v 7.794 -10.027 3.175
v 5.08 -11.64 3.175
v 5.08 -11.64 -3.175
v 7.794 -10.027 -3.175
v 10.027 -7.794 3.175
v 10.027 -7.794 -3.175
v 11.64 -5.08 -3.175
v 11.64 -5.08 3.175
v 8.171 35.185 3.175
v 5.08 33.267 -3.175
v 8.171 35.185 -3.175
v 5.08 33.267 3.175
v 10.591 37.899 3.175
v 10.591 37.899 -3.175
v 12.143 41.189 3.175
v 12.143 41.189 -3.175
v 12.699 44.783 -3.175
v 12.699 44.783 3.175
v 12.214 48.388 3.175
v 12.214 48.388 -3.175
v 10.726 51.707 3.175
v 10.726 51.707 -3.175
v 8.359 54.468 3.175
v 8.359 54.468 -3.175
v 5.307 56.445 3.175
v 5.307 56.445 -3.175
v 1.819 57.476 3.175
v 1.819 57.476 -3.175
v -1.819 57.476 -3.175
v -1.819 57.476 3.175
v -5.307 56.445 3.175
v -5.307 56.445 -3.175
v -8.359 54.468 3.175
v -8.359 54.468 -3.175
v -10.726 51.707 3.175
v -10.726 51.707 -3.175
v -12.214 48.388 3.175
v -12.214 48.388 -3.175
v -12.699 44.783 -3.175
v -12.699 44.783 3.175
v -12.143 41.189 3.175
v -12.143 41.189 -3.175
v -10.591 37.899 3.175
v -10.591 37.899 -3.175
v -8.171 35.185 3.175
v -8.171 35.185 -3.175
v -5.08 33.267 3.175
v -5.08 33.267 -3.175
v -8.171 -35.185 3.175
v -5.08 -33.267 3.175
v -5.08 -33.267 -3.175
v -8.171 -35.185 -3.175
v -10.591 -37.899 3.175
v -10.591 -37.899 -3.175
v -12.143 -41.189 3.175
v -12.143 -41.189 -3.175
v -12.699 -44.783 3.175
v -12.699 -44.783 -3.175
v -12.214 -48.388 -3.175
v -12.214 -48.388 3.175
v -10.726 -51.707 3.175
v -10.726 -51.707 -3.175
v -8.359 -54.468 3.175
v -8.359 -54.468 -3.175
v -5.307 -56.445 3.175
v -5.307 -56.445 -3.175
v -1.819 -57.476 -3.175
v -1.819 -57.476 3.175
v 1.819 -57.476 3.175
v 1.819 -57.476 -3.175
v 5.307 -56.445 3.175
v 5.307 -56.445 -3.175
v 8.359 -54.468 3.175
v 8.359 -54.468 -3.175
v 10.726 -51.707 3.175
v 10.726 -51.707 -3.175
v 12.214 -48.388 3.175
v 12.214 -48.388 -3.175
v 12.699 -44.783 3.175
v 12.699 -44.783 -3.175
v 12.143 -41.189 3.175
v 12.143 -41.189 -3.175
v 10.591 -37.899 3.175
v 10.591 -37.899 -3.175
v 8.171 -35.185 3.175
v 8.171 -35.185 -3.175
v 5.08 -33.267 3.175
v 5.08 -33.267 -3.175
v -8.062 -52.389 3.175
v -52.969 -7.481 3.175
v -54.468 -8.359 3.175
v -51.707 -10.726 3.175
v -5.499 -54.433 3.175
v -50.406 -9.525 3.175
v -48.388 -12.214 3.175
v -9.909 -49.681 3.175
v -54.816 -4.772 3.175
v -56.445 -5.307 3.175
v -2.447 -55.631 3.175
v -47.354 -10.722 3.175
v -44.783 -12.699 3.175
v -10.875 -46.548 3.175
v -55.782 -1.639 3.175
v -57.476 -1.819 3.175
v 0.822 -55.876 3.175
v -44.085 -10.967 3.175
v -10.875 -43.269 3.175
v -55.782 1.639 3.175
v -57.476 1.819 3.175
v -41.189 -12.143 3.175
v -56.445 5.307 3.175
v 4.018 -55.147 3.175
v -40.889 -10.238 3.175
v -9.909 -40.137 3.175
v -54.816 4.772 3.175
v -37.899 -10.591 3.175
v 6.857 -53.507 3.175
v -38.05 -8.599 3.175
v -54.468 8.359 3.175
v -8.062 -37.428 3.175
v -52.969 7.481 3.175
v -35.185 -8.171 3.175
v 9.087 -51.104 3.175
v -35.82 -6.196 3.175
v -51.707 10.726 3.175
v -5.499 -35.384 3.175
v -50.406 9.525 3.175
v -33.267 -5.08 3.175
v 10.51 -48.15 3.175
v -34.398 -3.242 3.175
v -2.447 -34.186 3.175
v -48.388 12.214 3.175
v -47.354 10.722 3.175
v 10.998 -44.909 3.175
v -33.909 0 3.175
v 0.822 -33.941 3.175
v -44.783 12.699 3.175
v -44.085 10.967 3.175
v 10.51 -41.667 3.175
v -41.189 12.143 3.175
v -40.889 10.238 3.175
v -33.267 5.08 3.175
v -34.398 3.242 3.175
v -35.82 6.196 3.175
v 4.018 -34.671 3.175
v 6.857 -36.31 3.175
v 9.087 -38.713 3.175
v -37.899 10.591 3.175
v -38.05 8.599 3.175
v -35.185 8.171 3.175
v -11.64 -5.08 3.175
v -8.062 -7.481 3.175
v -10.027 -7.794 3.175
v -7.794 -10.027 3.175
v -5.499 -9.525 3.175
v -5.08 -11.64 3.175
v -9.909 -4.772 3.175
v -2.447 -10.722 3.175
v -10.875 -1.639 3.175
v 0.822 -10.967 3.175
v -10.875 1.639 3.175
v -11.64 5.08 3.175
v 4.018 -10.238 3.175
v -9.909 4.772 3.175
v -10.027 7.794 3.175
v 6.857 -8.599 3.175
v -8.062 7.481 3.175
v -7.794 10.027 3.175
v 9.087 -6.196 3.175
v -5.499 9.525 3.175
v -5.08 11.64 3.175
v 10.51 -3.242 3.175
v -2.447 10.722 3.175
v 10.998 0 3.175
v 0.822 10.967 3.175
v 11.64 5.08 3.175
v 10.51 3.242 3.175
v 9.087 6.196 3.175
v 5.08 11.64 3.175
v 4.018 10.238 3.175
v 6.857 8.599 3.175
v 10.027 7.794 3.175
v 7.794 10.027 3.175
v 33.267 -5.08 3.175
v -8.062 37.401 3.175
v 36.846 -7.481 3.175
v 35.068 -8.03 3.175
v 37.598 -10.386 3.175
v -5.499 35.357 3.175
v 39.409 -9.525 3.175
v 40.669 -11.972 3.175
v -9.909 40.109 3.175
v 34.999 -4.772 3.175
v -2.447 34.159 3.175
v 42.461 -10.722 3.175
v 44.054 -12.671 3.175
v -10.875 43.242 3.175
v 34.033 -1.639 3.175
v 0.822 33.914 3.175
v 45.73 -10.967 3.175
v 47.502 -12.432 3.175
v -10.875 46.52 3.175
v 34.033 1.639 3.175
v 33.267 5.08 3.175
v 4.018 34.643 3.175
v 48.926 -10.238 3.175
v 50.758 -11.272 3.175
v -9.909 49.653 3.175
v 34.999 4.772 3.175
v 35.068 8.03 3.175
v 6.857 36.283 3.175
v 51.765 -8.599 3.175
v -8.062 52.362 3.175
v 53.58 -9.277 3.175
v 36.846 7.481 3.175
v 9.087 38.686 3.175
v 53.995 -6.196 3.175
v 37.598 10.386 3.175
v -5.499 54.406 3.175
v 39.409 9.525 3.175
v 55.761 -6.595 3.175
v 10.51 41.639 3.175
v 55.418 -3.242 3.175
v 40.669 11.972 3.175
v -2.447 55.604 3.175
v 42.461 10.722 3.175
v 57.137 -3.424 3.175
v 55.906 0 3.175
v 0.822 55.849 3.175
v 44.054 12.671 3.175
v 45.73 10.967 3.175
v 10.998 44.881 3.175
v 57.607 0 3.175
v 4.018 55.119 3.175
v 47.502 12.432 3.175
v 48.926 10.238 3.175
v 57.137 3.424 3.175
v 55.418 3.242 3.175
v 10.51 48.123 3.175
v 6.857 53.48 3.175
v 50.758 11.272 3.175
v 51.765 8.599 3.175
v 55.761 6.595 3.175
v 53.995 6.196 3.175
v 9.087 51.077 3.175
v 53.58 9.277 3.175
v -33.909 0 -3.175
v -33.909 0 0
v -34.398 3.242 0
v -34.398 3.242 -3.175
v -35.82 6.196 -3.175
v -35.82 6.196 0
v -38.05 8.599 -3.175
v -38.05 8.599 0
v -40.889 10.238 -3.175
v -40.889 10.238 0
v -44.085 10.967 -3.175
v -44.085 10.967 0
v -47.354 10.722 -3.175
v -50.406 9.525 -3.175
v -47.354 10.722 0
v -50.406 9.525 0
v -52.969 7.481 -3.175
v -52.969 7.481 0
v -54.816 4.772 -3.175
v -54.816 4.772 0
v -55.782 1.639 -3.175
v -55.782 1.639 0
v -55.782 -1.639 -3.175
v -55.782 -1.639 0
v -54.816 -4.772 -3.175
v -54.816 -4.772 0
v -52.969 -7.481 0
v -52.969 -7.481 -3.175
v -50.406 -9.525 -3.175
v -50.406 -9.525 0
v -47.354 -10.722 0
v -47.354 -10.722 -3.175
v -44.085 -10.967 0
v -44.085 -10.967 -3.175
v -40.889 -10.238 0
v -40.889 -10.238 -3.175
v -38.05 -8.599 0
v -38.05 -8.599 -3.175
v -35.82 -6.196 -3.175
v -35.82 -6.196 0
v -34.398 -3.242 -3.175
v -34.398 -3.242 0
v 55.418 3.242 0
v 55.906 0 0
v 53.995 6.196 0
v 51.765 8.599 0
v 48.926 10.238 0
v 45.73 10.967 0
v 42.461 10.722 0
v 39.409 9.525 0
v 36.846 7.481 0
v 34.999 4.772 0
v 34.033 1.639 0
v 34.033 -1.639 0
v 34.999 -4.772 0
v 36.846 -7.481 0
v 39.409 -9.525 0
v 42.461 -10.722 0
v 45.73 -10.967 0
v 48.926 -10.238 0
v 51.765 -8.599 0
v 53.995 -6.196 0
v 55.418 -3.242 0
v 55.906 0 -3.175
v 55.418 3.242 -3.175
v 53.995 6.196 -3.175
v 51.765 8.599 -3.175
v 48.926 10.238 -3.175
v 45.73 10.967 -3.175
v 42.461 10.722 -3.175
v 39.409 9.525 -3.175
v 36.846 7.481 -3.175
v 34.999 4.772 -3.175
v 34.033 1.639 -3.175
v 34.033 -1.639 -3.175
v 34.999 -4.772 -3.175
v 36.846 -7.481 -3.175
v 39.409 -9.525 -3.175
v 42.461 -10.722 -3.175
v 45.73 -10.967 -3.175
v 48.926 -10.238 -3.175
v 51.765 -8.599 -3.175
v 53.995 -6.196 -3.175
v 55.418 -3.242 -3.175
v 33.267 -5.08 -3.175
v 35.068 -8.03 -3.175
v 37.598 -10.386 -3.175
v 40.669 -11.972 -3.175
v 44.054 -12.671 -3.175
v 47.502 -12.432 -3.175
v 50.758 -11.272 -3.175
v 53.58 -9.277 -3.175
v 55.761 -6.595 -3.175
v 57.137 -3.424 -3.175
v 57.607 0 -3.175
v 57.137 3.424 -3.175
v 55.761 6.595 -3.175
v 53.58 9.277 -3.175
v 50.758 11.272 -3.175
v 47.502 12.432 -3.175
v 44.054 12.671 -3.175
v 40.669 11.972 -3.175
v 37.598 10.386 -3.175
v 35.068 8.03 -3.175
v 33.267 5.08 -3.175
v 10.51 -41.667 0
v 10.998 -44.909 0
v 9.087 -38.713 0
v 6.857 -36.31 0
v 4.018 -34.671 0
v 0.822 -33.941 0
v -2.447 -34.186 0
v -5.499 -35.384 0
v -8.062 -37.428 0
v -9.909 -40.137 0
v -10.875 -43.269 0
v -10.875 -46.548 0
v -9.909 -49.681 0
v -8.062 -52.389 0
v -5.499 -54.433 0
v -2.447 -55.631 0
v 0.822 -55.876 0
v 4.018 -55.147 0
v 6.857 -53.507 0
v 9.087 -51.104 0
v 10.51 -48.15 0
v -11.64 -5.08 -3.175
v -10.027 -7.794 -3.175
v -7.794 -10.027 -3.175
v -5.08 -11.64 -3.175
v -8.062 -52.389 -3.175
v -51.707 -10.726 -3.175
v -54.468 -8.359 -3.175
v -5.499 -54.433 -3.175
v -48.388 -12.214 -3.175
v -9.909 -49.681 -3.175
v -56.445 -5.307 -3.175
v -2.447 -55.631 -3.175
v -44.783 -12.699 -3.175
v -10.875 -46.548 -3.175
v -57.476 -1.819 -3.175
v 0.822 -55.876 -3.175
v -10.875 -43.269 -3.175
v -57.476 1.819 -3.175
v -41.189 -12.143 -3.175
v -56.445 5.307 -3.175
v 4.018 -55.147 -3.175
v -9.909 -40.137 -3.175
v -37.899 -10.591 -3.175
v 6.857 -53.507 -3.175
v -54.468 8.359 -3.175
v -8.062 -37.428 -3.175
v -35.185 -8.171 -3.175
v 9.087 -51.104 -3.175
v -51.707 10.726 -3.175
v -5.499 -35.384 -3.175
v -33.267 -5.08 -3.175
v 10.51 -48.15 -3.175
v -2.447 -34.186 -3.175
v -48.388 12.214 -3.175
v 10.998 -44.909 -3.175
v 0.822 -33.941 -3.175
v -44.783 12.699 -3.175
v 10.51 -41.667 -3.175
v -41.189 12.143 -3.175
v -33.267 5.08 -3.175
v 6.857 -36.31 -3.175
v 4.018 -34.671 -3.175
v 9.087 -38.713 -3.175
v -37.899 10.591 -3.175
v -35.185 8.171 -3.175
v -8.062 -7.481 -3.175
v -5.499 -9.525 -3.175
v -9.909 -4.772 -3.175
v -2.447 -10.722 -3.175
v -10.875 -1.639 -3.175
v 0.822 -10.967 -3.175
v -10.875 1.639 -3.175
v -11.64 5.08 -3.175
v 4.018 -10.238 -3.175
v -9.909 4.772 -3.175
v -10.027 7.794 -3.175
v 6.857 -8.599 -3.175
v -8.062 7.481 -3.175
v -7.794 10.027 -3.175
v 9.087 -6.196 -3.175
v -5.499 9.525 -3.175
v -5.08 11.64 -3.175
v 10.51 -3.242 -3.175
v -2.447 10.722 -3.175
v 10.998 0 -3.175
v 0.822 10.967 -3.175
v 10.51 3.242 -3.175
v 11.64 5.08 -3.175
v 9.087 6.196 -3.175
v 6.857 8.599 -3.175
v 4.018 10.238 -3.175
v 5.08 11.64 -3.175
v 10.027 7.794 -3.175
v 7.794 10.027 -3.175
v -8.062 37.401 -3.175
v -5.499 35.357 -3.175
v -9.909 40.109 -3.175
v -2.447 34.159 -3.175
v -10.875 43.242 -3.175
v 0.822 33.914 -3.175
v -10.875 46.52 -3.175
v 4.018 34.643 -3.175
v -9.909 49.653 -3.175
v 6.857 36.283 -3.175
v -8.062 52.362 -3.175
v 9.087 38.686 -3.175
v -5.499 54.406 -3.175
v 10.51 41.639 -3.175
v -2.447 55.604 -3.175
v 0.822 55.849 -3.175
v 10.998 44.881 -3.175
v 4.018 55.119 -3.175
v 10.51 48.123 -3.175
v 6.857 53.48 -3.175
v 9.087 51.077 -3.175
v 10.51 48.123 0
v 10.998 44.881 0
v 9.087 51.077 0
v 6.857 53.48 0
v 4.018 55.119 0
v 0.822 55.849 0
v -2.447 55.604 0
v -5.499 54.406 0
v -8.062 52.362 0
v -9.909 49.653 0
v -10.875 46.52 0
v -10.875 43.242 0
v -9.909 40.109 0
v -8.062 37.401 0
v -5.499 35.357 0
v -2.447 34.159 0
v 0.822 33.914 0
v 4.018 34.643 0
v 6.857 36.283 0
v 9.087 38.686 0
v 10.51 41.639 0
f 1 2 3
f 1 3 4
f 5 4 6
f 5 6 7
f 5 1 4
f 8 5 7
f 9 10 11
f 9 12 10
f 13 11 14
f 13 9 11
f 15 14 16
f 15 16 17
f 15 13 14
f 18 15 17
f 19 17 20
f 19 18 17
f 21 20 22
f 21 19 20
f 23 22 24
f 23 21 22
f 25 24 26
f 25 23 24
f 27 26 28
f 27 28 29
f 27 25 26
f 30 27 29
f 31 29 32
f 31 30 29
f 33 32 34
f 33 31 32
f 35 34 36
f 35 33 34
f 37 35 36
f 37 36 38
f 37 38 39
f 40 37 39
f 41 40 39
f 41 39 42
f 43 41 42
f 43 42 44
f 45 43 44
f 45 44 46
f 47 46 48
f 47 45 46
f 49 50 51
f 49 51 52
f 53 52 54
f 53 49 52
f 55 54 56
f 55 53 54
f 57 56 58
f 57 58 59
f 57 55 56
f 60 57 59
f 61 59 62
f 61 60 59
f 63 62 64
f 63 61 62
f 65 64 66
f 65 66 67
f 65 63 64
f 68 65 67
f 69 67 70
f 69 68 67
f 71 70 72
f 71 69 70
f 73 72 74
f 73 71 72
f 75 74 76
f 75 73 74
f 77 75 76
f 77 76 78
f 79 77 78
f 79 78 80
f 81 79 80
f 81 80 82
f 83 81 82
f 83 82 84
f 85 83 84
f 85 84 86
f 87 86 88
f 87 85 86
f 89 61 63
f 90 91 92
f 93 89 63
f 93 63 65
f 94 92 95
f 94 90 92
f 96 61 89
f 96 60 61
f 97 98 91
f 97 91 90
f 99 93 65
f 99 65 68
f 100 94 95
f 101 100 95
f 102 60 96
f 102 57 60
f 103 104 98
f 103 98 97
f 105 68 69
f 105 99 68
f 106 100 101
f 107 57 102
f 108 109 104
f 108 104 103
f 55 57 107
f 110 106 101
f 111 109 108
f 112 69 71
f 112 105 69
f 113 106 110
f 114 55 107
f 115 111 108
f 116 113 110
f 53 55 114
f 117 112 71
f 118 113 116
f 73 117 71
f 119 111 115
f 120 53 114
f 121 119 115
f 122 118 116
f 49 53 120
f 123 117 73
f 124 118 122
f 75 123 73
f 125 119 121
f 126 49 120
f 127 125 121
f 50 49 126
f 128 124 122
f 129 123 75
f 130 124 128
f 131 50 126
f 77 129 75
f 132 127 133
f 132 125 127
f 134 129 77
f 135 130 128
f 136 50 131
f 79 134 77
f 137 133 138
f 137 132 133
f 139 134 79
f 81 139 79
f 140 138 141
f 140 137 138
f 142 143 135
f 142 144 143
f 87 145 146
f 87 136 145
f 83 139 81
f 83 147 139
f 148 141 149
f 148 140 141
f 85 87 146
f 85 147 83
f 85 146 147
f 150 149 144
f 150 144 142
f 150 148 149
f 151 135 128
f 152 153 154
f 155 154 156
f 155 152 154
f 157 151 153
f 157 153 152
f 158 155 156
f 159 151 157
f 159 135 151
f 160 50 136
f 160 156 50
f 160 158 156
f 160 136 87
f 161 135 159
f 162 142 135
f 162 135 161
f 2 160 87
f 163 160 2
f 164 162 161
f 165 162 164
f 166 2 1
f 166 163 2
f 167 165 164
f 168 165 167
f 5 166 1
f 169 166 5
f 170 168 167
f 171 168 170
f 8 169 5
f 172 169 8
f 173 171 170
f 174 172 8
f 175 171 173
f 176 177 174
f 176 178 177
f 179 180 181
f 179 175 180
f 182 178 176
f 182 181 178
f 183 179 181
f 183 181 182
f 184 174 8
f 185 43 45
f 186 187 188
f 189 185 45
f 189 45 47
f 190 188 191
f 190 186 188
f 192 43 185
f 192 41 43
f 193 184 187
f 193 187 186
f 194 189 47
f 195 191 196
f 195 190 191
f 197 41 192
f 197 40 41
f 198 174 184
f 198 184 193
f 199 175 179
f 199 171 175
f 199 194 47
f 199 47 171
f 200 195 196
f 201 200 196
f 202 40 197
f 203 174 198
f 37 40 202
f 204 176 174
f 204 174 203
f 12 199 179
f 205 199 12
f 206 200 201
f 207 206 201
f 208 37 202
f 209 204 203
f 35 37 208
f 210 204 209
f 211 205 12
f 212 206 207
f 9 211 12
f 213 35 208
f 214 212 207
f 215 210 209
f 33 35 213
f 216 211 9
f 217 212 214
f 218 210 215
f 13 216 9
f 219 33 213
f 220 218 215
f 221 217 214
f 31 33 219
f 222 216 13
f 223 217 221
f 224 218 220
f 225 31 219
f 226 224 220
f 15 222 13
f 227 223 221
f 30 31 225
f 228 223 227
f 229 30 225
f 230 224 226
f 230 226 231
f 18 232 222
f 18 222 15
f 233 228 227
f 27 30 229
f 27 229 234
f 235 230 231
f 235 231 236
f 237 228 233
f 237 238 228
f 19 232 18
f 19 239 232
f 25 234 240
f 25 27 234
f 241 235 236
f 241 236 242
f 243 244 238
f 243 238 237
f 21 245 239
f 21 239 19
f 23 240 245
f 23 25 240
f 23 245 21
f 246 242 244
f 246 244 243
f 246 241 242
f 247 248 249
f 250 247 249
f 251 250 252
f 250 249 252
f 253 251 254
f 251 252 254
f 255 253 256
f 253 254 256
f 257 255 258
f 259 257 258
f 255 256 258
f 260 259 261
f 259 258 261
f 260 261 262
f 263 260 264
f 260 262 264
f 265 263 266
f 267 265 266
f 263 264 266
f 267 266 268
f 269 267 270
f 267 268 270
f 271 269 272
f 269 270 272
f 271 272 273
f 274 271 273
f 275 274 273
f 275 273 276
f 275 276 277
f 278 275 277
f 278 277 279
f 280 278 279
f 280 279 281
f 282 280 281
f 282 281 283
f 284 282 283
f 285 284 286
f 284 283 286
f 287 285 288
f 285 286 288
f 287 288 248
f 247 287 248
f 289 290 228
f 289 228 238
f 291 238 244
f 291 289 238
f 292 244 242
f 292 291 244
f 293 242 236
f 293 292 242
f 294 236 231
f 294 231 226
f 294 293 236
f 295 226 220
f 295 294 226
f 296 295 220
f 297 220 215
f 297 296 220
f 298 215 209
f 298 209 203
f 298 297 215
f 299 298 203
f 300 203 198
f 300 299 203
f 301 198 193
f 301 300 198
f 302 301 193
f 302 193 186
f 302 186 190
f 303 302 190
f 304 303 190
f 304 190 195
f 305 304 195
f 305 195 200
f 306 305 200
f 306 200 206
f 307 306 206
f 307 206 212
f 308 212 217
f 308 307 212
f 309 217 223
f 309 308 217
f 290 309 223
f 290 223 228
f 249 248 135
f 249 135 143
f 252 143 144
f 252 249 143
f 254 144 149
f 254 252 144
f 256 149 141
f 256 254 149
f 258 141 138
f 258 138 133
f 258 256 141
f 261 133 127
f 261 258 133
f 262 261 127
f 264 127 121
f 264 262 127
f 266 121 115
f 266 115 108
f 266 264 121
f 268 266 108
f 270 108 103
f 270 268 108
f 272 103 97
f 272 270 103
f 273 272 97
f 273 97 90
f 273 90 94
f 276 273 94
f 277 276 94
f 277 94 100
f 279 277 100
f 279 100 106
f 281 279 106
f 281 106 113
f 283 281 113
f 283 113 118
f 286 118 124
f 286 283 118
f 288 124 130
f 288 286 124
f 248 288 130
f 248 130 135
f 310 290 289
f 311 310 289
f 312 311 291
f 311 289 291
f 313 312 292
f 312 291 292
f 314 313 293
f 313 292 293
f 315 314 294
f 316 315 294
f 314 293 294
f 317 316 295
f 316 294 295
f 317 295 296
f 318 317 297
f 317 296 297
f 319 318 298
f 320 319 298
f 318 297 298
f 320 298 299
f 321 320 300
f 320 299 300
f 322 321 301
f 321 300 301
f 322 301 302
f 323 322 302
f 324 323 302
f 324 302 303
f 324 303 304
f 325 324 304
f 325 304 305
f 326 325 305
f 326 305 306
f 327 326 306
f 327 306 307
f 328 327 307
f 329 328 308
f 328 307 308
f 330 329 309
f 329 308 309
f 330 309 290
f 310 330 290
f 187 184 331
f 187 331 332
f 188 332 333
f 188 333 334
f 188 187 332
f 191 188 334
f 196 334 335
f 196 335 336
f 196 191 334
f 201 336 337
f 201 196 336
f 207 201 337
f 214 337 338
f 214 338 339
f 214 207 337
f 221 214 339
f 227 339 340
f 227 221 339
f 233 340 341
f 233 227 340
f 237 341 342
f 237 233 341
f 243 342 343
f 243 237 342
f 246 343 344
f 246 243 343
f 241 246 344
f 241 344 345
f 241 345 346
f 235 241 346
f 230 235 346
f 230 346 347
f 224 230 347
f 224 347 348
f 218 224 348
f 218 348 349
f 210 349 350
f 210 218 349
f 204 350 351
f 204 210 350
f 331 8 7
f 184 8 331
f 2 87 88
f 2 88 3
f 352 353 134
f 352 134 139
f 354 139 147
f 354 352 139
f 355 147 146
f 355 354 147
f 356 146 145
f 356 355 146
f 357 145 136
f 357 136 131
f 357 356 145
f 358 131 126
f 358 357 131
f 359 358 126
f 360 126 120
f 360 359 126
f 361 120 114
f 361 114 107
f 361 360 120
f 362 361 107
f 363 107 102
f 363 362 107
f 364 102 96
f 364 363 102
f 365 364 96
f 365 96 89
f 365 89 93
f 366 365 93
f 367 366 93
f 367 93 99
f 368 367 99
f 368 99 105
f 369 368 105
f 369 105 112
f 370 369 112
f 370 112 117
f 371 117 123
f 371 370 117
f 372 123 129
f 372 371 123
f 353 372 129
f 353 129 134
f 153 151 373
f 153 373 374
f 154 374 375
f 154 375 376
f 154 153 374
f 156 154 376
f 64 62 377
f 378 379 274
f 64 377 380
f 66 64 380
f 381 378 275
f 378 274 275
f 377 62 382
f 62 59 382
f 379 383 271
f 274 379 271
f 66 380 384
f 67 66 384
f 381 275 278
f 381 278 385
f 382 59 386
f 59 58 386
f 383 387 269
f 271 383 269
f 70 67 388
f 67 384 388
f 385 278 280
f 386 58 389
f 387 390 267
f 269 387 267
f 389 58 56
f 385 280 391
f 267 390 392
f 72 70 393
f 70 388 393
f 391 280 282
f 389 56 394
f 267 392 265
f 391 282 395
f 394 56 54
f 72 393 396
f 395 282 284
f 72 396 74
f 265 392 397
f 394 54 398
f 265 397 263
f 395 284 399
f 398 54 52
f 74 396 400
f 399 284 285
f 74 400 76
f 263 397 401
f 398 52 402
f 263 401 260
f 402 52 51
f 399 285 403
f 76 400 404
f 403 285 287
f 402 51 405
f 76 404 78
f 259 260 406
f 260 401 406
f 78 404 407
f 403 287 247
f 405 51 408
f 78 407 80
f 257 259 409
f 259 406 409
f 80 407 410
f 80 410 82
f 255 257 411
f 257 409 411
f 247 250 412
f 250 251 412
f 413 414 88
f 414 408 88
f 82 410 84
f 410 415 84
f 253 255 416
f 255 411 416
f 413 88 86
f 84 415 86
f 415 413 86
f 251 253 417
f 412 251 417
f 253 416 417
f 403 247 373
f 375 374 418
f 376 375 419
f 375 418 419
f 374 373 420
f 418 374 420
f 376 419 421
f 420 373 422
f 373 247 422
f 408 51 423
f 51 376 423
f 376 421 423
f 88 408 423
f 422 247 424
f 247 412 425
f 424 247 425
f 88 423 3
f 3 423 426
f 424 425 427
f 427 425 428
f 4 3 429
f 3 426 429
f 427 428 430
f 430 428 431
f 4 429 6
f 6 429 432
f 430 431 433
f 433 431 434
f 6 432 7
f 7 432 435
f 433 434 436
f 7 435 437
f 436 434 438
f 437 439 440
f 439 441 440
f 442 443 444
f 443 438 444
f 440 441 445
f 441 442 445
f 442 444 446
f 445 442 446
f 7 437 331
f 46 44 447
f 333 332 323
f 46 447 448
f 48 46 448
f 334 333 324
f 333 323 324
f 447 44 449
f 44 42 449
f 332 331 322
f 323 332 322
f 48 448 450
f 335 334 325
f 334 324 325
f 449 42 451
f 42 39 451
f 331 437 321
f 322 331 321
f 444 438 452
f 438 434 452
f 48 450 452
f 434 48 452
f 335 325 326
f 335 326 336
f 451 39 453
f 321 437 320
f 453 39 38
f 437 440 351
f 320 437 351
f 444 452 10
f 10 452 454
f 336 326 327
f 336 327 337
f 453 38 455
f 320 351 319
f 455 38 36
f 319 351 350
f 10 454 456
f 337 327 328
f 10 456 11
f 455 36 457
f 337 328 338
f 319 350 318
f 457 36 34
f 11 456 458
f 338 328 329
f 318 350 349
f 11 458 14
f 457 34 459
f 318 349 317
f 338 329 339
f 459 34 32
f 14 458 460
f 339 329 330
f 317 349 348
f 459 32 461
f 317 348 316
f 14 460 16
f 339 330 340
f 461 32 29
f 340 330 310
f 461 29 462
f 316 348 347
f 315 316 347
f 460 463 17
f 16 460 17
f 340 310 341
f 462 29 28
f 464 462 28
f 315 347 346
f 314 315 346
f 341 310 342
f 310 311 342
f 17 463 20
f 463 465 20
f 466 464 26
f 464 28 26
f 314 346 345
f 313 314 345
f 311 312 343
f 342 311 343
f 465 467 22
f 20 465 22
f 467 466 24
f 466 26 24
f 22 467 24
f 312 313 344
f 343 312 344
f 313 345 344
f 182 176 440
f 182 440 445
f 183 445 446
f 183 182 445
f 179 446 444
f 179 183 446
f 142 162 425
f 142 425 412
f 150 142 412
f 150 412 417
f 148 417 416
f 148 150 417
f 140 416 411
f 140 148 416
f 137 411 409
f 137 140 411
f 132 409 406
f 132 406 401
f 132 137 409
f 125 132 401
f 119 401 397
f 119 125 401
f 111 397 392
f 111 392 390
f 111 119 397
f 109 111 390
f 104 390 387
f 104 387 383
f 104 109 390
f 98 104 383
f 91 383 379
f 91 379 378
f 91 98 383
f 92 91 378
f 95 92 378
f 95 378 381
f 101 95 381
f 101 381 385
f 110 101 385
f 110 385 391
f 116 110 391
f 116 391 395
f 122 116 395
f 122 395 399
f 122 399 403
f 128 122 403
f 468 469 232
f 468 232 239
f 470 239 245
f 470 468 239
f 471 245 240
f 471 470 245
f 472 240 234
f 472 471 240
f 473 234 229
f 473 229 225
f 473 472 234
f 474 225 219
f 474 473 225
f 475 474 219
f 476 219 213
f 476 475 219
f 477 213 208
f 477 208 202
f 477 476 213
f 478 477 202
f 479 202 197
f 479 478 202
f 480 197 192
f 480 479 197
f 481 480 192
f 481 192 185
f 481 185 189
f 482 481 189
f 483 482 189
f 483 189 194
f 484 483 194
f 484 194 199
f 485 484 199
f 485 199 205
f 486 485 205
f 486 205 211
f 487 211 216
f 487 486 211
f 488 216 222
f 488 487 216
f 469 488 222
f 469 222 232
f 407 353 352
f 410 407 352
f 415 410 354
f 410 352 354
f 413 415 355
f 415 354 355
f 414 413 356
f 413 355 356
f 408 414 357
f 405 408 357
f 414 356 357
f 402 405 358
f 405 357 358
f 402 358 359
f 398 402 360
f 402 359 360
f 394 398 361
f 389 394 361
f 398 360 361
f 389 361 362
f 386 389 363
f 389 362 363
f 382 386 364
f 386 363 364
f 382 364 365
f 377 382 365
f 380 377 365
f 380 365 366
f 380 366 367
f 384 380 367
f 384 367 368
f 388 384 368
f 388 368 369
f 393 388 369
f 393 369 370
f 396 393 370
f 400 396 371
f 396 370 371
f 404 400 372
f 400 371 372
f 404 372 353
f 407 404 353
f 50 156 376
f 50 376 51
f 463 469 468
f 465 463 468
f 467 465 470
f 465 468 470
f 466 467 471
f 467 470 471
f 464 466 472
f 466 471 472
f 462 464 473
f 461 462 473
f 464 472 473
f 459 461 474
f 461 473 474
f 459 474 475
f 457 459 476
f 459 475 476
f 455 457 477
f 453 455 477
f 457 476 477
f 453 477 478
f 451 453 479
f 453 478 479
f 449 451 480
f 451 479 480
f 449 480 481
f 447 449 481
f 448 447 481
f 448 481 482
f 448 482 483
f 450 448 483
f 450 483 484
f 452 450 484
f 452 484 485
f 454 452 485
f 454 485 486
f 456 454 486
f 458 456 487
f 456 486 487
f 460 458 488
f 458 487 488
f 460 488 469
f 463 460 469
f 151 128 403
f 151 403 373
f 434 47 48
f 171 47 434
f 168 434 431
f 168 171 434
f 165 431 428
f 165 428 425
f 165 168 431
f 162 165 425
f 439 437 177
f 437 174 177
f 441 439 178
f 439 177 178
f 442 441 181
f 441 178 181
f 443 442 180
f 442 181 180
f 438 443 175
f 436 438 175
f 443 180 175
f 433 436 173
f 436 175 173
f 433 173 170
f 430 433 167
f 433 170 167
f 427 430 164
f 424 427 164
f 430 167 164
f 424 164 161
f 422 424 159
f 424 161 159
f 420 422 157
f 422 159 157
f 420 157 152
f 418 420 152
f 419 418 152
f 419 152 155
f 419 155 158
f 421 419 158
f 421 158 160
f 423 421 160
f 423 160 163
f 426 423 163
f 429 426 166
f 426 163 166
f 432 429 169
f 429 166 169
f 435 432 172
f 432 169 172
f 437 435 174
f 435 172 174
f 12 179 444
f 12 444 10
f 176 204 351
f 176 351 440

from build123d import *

# Parameters (mm, degrees)
F2_DEPTH = 3.175
F1_R     = 10.9982
F3_DEPTH = 3.175


with BuildPart() as f2:
    # F0 (on Top) → F2 (new body, symmetric)
    with BuildSketch(Plane.XY):
        with BuildLine():
            Line((-5.08, 11.6397422652), (-5.08, 9.7567207606))
            Line((-5.08, 9.7567207606), (5.08, 9.7567207606))
            Line((5.08, 9.7567207606), (5.08, 11.6397422652))
            ThreePointArc((5.08, 11.6397422652), (0, 12.7), (-5.08, 11.6397422652))
        make_face()
        with BuildLine():
            Line((5.08, 9.7567207606), (-5.08, 9.7567207606))
            Line((-5.08, 9.7567207606), (-5.08, 11.6397422652))
            ThreePointArc((-5.08, 11.6397422652), (-8.9802561211, 8.9802561211), (-11.6397422652, 5.08))
            Line((-11.6397422652, 5.08), (-9.7536, 5.08))
            Line((-9.7536, 5.08), (-9.7536, -5.08))
            Line((-9.7536, -5.08), (-11.6397422652, -5.08))
            ThreePointArc((-11.6397422652, -5.08), (-8.9802561211, -8.9802561211), (-5.08, -11.6397422652))
            Line((-5.08, -11.6397422652), (-5.08, -9.7536))
            Line((-5.08, -9.7536), (5.08, -9.7536))
            Line((5.08, -9.7536), (5.08, -11.6397422652))
            ThreePointArc((5.08, -11.6397422652), (8.9802561211, -8.9802561211), (11.6397422652, -5.08))
            Line((11.6397422652, -5.08), (9.7536, -5.08))
            Line((9.7536, -5.08), (9.7536, 5.08))
            Line((9.7536, 5.08), (11.6397422652, 5.08))
            ThreePointArc((11.6397422652, 5.08), (8.9802561211, 8.9802561211), (5.08, 11.6397422652))
            Line((5.08, 11.6397422652), (5.08, 9.7567207606))
        make_face()
        with BuildLine():
            Line((-5.08, 33.2674577348), (-5.08, 11.6397422652))
            ThreePointArc((-5.08, 11.6397422652), (0, 12.7), (5.08, 11.6397422652))
            Line((5.08, 11.6397422652), (5.08, 33.2674577348))
            ThreePointArc((5.08, 33.2674577348), (0, 32.2072), (-5.08, 33.2674577348))
        make_face()
        with BuildLine():
            ThreePointArc((12.7, 44.9072), (-6.9560764803, 55.532782337), (-5.08, 33.2674577348))
            Line((-5.08, 33.2674577348), (-5.08, 35.1567207606))
            Line((-5.08, 35.1567207606), (5.08, 35.1567207606))
            Line((5.08, 35.1567207606), (5.08, 33.2674577348))
            ThreePointArc((5.08, 33.2674577348), (10.625582337, 37.9511235197), (12.7, 44.9072))
        make_face()
        with BuildLine():
            Line((-5.08, 35.1567207606), (-5.08, 33.2674577348))
            ThreePointArc((-5.08, 33.2674577348), (0, 32.2072), (5.08, 33.2674577348))
            Line((5.08, 33.2674577348), (5.08, 35.1567207606))
            Line((5.08, 35.1567207606), (-5.08, 35.1567207606))
        make_face()
        with BuildLine():
            ThreePointArc((-11.6397422652, -5.08), (-12.7, 0), (-11.6397422652, 5.08))
            Line((-11.6397422652, 5.08), (-33.2674577348, 5.08))
            ThreePointArc((-33.2674577348, 5.08), (-32.4750898258, 2.5947324749), (-32.2072, 0))
            ThreePointArc((-32.2072, 0), (-32.4750898258, -2.5947324749), (-33.2674577348, -5.08))
            Line((-33.2674577348, -5.08), (-11.6397422652, -5.08))
        make_face()
        with BuildLine():
            Line((-9.7536, 5.08), (-11.6397422652, 5.08))
            ThreePointArc((-11.6397422652, 5.08), (-12.7, 0), (-11.6397422652, -5.08))
            Line((-11.6397422652, -5.08), (-9.7536, -5.08))
            Line((-9.7536, -5.08), (-9.7536, 5.08))
        make_face()
        with BuildLine():
            ThreePointArc((12.7, 0), (12.4321101742, 2.5947324749), (11.6397422652, 5.08))
            Line((11.6397422652, 5.08), (9.7536, 5.08))
            Line((9.7536, 5.08), (9.7536, -5.08))
            Line((9.7536, -5.08), (11.6397422652, -5.08))
            ThreePointArc((11.6397422652, -5.08), (12.4321101742, -2.5947324749), (12.7, 0))
        make_face()
        with BuildLine():
            Line((33.2674577348, 5.08), (11.6397422652, 5.08))
            ThreePointArc((11.6397422652, 5.08), (12.4321101742, 2.5947324749), (12.7, 0))
            ThreePointArc((12.7, 0), (12.4321101742, -2.5947324749), (11.6397422652, -5.08))
            Line((11.6397422652, -5.08), (33.2674577348, -5.08))
            ThreePointArc((33.2674577348, -5.08), (32.2072, 0), (33.2674577348, 5.08))
        make_face()
        with BuildLine():
            ThreePointArc((-32.2072, 0), (-32.4750898258, 2.5947324749), (-33.2674577348, 5.08))
            Line((-33.2674577348, 5.08), (-35.1536, 5.08))
            Line((-35.1536, 5.08), (-35.1536, -5.08))
            Line((-35.1536, -5.08), (-33.2674577348, -5.08))
            ThreePointArc((-33.2674577348, -5.08), (-32.4750898258, -2.5947324749), (-32.2072, 0))
        make_face()
        with BuildLine():
            Line((-35.1536, 5.08), (-33.2674577348, 5.08))
            ThreePointArc((-33.2674577348, 5.08), (-57.6072, 0), (-33.2674577348, -5.08))
            Line((-33.2674577348, -5.08), (-35.1536, -5.08))
            Line((-35.1536, -5.08), (-35.1536, 5.08))
        make_face()
        with BuildLine():
            ThreePointArc((57.6072, 0), (47.5019324749, 12.4321101742), (33.2674577348, 5.08))
            Line((33.2674577348, 5.08), (35.1536, 5.08))
            Line((35.1536, 5.08), (35.1536, -5.08))
            Line((35.1536, -5.08), (33.2674577348, -5.08))
            ThreePointArc((33.2674577348, -5.08), (47.5019324749, -12.4321101742), (57.6072, 0))
        make_face()
        with BuildLine():
            Line((35.1536, 5.08), (33.2674577348, 5.08))
            ThreePointArc((33.2674577348, 5.08), (32.2072, 0), (33.2674577348, -5.08))
            Line((33.2674577348, -5.08), (35.1536, -5.08))
            Line((35.1536, -5.08), (35.1536, 5.08))
        make_face()
        with BuildLine():
            ThreePointArc((5.08, -11.6397422652), (0, -12.7), (-5.08, -11.6397422652))
            Line((-5.08, -11.6397422652), (-5.08, -33.2674577348))
            ThreePointArc((-5.08, -33.2674577348), (0, -32.2072), (5.08, -33.2674577348))
            Line((5.08, -33.2674577348), (5.08, -11.6397422652))
        make_face()
        with BuildLine():
            Line((-5.08, -9.7536), (-5.08, -11.6397422652))
            ThreePointArc((-5.08, -11.6397422652), (0, -12.7), (5.08, -11.6397422652))
            Line((5.08, -11.6397422652), (5.08, -9.7536))
            Line((5.08, -9.7536), (-5.08, -9.7536))
        make_face()
        with BuildLine():
            ThreePointArc((5.08, -33.2674577348), (0, -32.2072), (-5.08, -33.2674577348))
            Line((-5.08, -33.2674577348), (-5.08, -35.1536))
            Line((-5.08, -35.1536), (5.08, -35.1536))
            Line((5.08, -35.1536), (5.08, -33.2674577348))
        make_face()
        with BuildLine():
            Line((-5.08, -35.1536), (-5.08, -33.2674577348))
            ThreePointArc((-5.08, -33.2674577348), (-6.9560764803, -55.532782337), (12.7, -44.9072))
            ThreePointArc((12.7, -44.9072), (10.625582337, -37.9511235197), (5.08, -33.2674577348))
            Line((5.08, -33.2674577348), (5.08, -35.1536))
            Line((5.08, -35.1536), (-5.08, -35.1536))
        make_face()
    extrude(amount=F2_DEPTH, both=True)

    # F1 (on Top) → F3 (cut, symmetric)
    with BuildSketch(Plane.XY):
        with Locations((0, 44.881273061)):
            Circle(F1_R)
        with Locations((44.9082072701, 0)):
            Circle(F1_R)
        with Locations((-44.9071153058, 0)):
            Circle(F1_R)
        with Locations((0, -44.9086768341)):
            Circle(F1_R)
        Circle(F1_R)
    extrude(amount=F3_DEPTH, both=True, mode=Mode.SUBTRACT)


solid = f2.part
